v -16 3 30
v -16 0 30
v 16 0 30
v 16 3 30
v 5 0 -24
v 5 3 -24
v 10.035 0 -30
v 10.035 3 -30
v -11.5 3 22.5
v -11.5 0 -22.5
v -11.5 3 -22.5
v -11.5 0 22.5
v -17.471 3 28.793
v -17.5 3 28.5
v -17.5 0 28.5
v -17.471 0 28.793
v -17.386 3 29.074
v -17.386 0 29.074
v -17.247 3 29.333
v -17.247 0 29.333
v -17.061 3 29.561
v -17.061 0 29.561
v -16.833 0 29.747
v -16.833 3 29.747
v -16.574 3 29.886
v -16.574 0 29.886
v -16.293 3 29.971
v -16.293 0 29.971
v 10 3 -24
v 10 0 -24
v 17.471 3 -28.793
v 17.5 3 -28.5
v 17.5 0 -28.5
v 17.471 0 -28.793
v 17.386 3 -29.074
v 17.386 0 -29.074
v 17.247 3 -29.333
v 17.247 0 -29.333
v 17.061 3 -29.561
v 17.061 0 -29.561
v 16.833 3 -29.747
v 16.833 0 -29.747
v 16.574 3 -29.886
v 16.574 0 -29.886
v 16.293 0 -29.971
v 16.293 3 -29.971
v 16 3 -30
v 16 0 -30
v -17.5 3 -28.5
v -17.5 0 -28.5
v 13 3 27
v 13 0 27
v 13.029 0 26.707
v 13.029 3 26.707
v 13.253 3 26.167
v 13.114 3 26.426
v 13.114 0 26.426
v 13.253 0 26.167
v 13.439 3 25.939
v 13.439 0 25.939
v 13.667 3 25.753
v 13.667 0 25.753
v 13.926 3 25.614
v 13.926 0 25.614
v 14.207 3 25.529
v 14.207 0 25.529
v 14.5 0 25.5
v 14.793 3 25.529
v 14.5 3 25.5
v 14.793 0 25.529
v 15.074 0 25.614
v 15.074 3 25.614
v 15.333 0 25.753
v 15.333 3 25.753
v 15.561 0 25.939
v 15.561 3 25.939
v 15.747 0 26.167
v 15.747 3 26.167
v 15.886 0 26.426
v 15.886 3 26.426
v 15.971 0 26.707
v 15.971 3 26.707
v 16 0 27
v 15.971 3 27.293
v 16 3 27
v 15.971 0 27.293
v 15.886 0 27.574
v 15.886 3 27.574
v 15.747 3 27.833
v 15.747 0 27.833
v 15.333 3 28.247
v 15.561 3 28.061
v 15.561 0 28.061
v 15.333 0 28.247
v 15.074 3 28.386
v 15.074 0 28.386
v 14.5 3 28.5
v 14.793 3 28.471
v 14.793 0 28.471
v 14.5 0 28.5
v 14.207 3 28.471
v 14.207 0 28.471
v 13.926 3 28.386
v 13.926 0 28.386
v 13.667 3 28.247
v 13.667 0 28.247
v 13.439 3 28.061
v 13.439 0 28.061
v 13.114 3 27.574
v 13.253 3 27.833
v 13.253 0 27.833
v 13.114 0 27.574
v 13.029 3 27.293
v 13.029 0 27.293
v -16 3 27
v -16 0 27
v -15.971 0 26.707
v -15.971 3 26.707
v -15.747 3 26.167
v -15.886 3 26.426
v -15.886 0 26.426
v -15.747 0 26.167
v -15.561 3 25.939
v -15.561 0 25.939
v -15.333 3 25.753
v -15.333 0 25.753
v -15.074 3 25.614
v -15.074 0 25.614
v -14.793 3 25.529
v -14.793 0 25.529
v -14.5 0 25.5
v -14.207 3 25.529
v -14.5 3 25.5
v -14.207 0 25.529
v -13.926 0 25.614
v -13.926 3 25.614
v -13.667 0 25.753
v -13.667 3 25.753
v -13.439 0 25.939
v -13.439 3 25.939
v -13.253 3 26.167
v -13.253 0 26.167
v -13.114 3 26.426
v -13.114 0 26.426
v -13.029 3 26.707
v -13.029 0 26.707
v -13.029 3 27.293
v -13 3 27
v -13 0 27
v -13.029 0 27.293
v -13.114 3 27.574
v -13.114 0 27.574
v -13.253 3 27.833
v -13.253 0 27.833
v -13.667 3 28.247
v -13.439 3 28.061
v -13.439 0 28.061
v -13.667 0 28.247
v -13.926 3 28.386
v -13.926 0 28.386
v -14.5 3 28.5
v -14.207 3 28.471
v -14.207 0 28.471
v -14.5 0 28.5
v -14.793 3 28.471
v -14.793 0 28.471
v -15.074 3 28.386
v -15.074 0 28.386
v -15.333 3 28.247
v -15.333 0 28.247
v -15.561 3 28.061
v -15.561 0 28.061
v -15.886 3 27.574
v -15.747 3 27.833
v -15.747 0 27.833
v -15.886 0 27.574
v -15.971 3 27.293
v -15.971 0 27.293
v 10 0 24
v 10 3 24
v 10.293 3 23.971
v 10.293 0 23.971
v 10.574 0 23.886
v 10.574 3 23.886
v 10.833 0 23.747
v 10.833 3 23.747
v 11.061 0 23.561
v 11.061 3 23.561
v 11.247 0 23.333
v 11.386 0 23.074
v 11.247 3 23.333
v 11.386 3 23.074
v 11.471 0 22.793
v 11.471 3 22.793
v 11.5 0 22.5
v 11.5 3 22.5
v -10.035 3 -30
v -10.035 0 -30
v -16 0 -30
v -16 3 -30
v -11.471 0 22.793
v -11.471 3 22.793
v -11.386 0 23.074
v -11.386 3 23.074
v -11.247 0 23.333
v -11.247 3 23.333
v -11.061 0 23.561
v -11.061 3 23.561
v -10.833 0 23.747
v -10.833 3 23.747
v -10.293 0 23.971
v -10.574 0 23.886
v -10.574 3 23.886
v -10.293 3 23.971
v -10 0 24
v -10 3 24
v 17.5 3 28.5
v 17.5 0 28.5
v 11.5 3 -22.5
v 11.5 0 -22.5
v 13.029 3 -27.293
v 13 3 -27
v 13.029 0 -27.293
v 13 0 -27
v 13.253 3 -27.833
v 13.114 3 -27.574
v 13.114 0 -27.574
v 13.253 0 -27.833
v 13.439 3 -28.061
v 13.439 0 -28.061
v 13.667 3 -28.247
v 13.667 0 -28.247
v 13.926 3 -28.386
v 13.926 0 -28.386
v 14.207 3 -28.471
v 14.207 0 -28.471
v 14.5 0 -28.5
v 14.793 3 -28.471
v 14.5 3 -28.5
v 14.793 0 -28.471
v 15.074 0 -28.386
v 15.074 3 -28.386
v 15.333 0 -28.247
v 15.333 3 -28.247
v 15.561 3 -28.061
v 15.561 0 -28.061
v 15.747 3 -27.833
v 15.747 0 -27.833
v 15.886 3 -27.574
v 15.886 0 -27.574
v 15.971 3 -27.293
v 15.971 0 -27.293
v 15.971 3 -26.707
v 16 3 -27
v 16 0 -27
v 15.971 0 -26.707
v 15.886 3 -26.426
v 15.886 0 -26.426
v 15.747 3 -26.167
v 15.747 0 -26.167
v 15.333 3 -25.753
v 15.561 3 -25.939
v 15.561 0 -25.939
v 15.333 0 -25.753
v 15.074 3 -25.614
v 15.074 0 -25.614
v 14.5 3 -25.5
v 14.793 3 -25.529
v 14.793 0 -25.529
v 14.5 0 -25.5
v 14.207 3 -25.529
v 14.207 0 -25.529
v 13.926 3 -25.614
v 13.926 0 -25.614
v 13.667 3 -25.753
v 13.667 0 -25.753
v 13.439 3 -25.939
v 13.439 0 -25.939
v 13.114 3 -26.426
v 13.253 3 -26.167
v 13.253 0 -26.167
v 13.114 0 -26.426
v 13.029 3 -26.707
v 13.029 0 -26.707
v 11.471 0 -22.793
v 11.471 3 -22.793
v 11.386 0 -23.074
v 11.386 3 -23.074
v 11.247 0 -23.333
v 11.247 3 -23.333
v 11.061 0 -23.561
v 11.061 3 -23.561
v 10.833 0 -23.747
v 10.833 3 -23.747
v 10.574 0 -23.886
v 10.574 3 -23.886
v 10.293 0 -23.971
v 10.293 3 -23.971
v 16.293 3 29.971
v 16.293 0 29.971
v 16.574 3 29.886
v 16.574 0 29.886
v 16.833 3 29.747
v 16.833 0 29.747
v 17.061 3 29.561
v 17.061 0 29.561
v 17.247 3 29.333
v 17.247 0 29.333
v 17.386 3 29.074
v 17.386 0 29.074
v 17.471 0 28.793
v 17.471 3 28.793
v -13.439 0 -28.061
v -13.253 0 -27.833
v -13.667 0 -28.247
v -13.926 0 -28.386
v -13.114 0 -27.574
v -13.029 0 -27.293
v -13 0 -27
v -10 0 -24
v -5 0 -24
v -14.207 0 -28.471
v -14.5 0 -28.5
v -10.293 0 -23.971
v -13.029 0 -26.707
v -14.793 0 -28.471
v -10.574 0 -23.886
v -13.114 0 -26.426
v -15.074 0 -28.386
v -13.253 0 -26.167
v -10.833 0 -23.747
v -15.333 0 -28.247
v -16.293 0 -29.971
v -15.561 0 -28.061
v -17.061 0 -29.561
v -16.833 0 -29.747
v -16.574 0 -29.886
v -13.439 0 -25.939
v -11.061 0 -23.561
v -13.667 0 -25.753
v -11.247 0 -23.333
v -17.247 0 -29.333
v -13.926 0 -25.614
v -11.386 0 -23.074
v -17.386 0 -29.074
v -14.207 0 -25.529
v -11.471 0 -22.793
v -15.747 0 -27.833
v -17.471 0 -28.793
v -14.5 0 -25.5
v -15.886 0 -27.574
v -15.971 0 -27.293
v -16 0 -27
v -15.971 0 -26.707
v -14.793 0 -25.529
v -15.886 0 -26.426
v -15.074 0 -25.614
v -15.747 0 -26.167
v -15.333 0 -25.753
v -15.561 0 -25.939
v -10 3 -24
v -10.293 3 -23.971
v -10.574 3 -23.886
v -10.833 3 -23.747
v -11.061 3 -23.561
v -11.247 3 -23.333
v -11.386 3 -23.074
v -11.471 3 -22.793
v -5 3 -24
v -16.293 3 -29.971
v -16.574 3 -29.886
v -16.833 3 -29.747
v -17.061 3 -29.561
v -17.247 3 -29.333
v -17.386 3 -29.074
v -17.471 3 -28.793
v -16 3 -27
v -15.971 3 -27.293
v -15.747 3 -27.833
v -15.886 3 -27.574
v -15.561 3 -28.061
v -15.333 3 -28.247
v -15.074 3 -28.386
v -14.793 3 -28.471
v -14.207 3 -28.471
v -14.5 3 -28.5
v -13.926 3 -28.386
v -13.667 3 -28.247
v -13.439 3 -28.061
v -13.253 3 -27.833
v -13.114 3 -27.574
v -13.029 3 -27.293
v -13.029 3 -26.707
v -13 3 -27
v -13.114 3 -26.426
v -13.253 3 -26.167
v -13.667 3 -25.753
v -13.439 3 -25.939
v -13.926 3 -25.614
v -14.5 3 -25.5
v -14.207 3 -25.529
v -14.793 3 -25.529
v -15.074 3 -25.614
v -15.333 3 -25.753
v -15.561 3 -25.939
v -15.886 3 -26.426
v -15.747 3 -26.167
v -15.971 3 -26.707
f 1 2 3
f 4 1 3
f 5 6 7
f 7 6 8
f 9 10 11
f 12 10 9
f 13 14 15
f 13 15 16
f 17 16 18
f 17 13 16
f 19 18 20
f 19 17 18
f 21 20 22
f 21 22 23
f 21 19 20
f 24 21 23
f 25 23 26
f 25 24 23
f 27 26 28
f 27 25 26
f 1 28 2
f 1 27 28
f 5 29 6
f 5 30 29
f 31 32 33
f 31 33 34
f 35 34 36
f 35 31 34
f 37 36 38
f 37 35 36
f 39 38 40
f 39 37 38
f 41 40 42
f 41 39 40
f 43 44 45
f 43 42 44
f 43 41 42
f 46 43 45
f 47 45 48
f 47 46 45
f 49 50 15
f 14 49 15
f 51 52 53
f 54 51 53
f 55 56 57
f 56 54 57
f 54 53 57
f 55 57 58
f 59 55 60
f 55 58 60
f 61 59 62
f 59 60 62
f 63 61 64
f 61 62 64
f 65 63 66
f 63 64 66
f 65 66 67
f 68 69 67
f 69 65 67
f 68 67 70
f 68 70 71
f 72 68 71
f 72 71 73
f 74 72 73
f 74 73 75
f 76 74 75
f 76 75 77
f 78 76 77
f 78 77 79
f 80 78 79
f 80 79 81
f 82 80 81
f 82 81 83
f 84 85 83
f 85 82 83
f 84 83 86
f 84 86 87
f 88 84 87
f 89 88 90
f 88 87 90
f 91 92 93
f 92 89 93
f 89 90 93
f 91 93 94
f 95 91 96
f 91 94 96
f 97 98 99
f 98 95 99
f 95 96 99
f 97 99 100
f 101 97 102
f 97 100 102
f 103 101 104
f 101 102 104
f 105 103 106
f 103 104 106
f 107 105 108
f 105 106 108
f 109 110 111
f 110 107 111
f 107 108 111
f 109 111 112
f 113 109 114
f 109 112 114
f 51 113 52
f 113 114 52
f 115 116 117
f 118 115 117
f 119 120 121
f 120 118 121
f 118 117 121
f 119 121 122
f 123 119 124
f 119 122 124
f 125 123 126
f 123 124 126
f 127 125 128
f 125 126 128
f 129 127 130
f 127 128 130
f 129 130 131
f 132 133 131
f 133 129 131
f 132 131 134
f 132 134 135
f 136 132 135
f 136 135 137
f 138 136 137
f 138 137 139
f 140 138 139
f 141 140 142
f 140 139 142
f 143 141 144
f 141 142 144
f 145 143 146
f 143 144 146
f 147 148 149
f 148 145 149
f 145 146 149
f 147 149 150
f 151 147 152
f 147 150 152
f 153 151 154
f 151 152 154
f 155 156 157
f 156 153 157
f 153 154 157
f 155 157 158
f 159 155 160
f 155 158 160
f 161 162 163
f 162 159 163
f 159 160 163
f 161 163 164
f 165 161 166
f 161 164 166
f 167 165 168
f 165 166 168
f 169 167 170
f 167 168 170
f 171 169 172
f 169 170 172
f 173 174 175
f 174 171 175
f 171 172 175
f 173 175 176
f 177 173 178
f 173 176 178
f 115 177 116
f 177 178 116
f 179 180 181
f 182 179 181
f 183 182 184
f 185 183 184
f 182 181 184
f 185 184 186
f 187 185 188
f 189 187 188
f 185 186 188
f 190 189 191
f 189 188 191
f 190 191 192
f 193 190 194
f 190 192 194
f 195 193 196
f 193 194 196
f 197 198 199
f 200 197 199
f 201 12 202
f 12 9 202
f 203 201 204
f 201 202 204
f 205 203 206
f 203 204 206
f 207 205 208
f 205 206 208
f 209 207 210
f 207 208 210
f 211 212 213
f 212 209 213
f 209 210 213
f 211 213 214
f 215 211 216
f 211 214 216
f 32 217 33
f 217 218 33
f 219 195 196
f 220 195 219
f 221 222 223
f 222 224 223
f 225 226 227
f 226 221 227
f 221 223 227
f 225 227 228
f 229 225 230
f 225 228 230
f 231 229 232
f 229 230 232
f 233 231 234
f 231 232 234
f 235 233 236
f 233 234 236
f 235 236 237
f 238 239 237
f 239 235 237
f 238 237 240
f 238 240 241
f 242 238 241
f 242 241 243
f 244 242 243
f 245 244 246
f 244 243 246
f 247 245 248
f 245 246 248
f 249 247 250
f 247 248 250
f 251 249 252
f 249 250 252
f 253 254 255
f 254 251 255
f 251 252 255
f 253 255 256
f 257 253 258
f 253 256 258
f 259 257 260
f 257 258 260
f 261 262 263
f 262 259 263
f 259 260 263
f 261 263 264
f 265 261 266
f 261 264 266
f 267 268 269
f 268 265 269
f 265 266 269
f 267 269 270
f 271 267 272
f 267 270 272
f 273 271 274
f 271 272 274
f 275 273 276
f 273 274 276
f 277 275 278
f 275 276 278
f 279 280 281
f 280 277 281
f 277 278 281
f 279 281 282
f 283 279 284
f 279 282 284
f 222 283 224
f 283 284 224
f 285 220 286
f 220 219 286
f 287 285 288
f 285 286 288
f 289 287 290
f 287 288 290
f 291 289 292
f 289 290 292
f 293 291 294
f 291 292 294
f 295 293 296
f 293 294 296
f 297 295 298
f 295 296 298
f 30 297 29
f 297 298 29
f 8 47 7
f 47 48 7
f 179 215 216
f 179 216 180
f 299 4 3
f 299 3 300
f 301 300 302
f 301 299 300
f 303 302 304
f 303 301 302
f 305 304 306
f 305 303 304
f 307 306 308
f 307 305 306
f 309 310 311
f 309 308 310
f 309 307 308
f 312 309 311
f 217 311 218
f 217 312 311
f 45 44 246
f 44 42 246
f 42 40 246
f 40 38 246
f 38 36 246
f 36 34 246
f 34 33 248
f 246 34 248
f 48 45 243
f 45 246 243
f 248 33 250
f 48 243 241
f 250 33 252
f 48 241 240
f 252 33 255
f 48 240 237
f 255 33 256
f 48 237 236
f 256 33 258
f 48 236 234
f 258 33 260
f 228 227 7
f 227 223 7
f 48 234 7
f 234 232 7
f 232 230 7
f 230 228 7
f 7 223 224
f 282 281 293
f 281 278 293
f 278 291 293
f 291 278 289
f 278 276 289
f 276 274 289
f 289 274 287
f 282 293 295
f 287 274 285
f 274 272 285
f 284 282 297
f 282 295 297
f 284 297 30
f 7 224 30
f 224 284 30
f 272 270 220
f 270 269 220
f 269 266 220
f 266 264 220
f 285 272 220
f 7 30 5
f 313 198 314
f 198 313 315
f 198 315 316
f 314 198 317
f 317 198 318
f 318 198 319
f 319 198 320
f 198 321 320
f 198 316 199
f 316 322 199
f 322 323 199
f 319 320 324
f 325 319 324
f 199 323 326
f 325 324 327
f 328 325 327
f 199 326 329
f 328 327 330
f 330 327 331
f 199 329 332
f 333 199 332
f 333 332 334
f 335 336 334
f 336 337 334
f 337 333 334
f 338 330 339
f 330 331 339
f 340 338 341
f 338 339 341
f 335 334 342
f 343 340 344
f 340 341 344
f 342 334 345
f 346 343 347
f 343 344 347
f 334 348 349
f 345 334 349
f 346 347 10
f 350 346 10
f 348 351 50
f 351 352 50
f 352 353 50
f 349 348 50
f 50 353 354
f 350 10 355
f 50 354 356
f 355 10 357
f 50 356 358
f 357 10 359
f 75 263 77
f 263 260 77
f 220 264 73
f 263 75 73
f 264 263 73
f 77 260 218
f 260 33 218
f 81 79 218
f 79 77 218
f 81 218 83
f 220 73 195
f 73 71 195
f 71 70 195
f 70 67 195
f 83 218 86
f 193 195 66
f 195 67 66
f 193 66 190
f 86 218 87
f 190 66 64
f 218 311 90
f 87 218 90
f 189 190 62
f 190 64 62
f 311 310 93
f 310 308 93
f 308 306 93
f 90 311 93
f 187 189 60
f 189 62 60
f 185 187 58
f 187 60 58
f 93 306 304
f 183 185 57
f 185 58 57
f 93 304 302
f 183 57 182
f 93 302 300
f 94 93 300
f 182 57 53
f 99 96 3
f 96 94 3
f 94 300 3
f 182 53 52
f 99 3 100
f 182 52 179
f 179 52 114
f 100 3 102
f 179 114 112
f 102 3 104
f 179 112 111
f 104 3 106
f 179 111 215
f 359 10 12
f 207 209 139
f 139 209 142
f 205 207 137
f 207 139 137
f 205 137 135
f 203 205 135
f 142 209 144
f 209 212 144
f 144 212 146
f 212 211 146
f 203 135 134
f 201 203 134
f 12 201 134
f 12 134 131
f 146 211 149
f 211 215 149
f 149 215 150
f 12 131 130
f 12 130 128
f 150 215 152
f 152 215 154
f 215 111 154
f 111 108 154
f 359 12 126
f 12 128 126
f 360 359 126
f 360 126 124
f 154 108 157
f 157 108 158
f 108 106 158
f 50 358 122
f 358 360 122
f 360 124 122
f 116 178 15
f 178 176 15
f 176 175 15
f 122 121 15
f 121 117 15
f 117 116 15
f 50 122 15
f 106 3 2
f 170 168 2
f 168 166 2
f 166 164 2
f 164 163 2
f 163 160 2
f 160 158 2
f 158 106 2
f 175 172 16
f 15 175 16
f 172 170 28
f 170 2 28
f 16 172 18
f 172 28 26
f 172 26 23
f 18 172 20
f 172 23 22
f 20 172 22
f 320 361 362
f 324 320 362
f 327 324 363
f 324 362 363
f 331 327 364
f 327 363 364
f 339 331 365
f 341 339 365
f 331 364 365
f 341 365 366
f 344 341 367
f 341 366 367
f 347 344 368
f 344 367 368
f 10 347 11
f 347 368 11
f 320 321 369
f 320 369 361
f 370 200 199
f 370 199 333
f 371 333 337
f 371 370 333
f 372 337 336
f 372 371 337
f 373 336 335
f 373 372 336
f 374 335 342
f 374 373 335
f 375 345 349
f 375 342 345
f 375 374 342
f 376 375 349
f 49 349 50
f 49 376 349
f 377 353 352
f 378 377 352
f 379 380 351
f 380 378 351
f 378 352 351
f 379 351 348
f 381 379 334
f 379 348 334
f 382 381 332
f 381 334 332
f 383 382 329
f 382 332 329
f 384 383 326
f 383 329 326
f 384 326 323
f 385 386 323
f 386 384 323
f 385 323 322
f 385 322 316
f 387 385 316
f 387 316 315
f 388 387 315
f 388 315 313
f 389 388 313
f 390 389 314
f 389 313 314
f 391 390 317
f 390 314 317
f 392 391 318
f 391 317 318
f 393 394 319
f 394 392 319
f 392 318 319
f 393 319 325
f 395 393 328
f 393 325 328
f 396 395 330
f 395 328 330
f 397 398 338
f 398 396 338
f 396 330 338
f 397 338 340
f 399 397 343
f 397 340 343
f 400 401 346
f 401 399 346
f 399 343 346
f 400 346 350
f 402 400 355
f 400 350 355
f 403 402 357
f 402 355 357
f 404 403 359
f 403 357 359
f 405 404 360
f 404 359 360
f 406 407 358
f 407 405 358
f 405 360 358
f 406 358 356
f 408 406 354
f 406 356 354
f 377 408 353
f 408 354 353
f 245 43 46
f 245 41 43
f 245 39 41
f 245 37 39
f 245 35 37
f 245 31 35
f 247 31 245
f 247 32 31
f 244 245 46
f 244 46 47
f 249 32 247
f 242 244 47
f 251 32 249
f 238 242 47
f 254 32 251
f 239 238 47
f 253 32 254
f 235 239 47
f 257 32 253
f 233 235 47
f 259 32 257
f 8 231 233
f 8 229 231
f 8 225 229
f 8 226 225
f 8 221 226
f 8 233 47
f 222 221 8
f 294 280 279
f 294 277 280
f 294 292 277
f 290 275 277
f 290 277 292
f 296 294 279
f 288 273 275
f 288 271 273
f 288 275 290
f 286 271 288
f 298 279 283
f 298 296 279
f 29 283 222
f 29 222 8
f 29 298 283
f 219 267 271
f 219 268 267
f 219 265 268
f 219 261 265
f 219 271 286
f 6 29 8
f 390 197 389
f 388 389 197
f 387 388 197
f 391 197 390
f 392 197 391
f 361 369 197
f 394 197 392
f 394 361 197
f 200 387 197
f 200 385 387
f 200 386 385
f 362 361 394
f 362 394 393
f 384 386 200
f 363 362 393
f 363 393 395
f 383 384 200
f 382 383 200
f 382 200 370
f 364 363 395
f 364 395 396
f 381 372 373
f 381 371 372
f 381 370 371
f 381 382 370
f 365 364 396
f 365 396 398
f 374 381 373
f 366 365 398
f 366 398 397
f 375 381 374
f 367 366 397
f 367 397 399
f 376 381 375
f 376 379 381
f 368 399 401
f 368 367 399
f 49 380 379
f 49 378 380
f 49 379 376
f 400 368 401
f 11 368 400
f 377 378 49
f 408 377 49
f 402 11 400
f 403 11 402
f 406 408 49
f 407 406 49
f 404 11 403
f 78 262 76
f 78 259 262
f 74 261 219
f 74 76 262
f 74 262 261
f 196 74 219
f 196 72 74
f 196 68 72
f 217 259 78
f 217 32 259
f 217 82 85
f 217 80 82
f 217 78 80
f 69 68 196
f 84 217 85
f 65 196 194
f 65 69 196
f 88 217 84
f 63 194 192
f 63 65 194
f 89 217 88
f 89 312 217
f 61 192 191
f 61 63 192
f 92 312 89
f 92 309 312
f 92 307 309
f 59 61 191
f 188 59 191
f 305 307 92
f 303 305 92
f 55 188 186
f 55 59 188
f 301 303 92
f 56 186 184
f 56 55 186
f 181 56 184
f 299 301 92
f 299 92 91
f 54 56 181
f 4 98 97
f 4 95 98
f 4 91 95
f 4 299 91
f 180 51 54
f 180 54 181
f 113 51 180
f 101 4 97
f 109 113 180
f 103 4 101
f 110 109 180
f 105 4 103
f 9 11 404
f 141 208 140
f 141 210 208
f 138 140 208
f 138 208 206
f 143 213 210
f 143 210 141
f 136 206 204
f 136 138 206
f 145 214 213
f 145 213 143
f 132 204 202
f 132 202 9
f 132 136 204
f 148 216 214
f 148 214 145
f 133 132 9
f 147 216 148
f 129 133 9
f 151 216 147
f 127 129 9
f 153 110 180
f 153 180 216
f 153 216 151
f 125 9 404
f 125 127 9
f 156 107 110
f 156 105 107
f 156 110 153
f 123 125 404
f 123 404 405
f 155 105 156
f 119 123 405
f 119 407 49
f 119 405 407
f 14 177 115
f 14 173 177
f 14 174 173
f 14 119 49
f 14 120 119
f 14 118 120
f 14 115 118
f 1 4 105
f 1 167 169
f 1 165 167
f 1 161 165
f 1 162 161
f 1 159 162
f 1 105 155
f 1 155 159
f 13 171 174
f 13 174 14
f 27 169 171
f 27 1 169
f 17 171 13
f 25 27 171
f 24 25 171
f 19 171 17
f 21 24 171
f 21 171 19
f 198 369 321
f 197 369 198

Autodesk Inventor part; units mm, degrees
ref_plane "YZ Plane" through (0, 0, 0) normal (1, 0, 0) x (0, 1, 0)
ref_plane "XZ Plane" through (0, 0, 0) normal (0, 1, 0) x (-1, 0, 0)
ref_plane "XY Plane" through (0, 0, 0) normal (0, 0, 1) x (1, 0, 0)
sketch "Sketch1" plane through (0, 0, 0) normal (0, 1, 0) x (-1, 0, 0)
  line L0 (11.5, 24) -> (-11.5, 24)
  line L1 (-11.5, 24) -> (-11.5, -24)
  line L2 (-11.5, -24) -> (11.5, -24)
  line L3 (11.5, -24) -> (11.5, 24)
  line L4 (11.5, 24) -> (-11.5, -24) construction
  line L5 (-11.5, 24) -> (11.5, -24) construction
  line L6 (-8.5, 21) -> (8.5, 21)
  line L7 (8.5, 21) -> (8.5, -21)
  line L8 (8.5, -21) -> (-8.5, -21)
  line L9 (-8.5, -21) -> (-8.5, 21)
  line L10 (-8.5, 21) -> (8.5, -21) construction
  line L11 (8.5, 21) -> (-8.5, -21) construction
  line L12 (0, 0) -> (-8.5, 0) construction
  circle A0 centre (0, -12) radius 1.5
  circle A1 centre (0, 12) radius 1.5
  line L13 (17.5, 30) -> (-17.5, 30)
  line L14 (-17.5, 30) -> (-17.5, -30)
  line L15 (-17.5, -30) -> (17.5, -30)
  line L16 (17.5, -30) -> (17.5, 30)
  line L17 (17.5, 30) -> (-17.5, -30) construction
  line L18 (-17.5, 30) -> (17.5, -30) construction
  circle A2 centre (14.5, 27) radius 1.5
  circle A3 centre (-14.5, 27) radius 1.5
  circle A4 centre (14.5, -27) radius 1.5
  circle A5 centre (-14.5, -27) radius 1.5
  dimension "d0" = 23
  dimension "d1" = 48
  dimension "d3" = 3
  dimension "d4" = 3
  dimension "d5" = 3
  dimension "d6" = 12
  dimension "d9" = 6
  dimension "d10" = 6
  dimension "d13" = 3
  dimension "d14" = 3
  dimension "d15" = 3
  dimension "d16" = 3
  dimension "d17" = 3
  dimension "d18" = 3
extrude "Extrusion1" add sketch "Sketch1" along normal blind 3 contours L16 L15 L14 L13
fillet "Fillet2" radius 1.5 8 edges at (17.5, 1.5, -30) (17.5, 1.5, 30) (-17.5, 1.5, 30) (-17.5, 1.5, -30) (11.5, 1.5, 24) (-11.5, 1.5, 24) (-11.5, 1.5, -24) (11.5, 1.5, -24)
sketch "Sketch2" plane through (0, 3, 0) normal (0, 1, 0) x (1, 0, 0)
  line L0 (-10, 24) -> (10, 24) projected
  line L1 (0, 24) -> (0, 29.9588) construction
  line L2 (0, 24) -> (-5, 24)
  line L3 (16, 30) -> (-16, 30) projected
  line L4 (-5, 24) -> (-10.0346, 30)
  line L5 (10, 24) -> (-10, 24)
  line L6 (-16, 30) -> (16, 30)
  line L7 (5, 24) -> (10.0346, 30)
  line L8 (-10.0346, 30) -> (10.0346, 30)
  point P0 (0, 0)
  dimension "d20" = 40
  dimension "d22" = 5
extrude "Extrusion2" cut sketch "Sketch2" against normal blind 10
properties part number "Middle external"
